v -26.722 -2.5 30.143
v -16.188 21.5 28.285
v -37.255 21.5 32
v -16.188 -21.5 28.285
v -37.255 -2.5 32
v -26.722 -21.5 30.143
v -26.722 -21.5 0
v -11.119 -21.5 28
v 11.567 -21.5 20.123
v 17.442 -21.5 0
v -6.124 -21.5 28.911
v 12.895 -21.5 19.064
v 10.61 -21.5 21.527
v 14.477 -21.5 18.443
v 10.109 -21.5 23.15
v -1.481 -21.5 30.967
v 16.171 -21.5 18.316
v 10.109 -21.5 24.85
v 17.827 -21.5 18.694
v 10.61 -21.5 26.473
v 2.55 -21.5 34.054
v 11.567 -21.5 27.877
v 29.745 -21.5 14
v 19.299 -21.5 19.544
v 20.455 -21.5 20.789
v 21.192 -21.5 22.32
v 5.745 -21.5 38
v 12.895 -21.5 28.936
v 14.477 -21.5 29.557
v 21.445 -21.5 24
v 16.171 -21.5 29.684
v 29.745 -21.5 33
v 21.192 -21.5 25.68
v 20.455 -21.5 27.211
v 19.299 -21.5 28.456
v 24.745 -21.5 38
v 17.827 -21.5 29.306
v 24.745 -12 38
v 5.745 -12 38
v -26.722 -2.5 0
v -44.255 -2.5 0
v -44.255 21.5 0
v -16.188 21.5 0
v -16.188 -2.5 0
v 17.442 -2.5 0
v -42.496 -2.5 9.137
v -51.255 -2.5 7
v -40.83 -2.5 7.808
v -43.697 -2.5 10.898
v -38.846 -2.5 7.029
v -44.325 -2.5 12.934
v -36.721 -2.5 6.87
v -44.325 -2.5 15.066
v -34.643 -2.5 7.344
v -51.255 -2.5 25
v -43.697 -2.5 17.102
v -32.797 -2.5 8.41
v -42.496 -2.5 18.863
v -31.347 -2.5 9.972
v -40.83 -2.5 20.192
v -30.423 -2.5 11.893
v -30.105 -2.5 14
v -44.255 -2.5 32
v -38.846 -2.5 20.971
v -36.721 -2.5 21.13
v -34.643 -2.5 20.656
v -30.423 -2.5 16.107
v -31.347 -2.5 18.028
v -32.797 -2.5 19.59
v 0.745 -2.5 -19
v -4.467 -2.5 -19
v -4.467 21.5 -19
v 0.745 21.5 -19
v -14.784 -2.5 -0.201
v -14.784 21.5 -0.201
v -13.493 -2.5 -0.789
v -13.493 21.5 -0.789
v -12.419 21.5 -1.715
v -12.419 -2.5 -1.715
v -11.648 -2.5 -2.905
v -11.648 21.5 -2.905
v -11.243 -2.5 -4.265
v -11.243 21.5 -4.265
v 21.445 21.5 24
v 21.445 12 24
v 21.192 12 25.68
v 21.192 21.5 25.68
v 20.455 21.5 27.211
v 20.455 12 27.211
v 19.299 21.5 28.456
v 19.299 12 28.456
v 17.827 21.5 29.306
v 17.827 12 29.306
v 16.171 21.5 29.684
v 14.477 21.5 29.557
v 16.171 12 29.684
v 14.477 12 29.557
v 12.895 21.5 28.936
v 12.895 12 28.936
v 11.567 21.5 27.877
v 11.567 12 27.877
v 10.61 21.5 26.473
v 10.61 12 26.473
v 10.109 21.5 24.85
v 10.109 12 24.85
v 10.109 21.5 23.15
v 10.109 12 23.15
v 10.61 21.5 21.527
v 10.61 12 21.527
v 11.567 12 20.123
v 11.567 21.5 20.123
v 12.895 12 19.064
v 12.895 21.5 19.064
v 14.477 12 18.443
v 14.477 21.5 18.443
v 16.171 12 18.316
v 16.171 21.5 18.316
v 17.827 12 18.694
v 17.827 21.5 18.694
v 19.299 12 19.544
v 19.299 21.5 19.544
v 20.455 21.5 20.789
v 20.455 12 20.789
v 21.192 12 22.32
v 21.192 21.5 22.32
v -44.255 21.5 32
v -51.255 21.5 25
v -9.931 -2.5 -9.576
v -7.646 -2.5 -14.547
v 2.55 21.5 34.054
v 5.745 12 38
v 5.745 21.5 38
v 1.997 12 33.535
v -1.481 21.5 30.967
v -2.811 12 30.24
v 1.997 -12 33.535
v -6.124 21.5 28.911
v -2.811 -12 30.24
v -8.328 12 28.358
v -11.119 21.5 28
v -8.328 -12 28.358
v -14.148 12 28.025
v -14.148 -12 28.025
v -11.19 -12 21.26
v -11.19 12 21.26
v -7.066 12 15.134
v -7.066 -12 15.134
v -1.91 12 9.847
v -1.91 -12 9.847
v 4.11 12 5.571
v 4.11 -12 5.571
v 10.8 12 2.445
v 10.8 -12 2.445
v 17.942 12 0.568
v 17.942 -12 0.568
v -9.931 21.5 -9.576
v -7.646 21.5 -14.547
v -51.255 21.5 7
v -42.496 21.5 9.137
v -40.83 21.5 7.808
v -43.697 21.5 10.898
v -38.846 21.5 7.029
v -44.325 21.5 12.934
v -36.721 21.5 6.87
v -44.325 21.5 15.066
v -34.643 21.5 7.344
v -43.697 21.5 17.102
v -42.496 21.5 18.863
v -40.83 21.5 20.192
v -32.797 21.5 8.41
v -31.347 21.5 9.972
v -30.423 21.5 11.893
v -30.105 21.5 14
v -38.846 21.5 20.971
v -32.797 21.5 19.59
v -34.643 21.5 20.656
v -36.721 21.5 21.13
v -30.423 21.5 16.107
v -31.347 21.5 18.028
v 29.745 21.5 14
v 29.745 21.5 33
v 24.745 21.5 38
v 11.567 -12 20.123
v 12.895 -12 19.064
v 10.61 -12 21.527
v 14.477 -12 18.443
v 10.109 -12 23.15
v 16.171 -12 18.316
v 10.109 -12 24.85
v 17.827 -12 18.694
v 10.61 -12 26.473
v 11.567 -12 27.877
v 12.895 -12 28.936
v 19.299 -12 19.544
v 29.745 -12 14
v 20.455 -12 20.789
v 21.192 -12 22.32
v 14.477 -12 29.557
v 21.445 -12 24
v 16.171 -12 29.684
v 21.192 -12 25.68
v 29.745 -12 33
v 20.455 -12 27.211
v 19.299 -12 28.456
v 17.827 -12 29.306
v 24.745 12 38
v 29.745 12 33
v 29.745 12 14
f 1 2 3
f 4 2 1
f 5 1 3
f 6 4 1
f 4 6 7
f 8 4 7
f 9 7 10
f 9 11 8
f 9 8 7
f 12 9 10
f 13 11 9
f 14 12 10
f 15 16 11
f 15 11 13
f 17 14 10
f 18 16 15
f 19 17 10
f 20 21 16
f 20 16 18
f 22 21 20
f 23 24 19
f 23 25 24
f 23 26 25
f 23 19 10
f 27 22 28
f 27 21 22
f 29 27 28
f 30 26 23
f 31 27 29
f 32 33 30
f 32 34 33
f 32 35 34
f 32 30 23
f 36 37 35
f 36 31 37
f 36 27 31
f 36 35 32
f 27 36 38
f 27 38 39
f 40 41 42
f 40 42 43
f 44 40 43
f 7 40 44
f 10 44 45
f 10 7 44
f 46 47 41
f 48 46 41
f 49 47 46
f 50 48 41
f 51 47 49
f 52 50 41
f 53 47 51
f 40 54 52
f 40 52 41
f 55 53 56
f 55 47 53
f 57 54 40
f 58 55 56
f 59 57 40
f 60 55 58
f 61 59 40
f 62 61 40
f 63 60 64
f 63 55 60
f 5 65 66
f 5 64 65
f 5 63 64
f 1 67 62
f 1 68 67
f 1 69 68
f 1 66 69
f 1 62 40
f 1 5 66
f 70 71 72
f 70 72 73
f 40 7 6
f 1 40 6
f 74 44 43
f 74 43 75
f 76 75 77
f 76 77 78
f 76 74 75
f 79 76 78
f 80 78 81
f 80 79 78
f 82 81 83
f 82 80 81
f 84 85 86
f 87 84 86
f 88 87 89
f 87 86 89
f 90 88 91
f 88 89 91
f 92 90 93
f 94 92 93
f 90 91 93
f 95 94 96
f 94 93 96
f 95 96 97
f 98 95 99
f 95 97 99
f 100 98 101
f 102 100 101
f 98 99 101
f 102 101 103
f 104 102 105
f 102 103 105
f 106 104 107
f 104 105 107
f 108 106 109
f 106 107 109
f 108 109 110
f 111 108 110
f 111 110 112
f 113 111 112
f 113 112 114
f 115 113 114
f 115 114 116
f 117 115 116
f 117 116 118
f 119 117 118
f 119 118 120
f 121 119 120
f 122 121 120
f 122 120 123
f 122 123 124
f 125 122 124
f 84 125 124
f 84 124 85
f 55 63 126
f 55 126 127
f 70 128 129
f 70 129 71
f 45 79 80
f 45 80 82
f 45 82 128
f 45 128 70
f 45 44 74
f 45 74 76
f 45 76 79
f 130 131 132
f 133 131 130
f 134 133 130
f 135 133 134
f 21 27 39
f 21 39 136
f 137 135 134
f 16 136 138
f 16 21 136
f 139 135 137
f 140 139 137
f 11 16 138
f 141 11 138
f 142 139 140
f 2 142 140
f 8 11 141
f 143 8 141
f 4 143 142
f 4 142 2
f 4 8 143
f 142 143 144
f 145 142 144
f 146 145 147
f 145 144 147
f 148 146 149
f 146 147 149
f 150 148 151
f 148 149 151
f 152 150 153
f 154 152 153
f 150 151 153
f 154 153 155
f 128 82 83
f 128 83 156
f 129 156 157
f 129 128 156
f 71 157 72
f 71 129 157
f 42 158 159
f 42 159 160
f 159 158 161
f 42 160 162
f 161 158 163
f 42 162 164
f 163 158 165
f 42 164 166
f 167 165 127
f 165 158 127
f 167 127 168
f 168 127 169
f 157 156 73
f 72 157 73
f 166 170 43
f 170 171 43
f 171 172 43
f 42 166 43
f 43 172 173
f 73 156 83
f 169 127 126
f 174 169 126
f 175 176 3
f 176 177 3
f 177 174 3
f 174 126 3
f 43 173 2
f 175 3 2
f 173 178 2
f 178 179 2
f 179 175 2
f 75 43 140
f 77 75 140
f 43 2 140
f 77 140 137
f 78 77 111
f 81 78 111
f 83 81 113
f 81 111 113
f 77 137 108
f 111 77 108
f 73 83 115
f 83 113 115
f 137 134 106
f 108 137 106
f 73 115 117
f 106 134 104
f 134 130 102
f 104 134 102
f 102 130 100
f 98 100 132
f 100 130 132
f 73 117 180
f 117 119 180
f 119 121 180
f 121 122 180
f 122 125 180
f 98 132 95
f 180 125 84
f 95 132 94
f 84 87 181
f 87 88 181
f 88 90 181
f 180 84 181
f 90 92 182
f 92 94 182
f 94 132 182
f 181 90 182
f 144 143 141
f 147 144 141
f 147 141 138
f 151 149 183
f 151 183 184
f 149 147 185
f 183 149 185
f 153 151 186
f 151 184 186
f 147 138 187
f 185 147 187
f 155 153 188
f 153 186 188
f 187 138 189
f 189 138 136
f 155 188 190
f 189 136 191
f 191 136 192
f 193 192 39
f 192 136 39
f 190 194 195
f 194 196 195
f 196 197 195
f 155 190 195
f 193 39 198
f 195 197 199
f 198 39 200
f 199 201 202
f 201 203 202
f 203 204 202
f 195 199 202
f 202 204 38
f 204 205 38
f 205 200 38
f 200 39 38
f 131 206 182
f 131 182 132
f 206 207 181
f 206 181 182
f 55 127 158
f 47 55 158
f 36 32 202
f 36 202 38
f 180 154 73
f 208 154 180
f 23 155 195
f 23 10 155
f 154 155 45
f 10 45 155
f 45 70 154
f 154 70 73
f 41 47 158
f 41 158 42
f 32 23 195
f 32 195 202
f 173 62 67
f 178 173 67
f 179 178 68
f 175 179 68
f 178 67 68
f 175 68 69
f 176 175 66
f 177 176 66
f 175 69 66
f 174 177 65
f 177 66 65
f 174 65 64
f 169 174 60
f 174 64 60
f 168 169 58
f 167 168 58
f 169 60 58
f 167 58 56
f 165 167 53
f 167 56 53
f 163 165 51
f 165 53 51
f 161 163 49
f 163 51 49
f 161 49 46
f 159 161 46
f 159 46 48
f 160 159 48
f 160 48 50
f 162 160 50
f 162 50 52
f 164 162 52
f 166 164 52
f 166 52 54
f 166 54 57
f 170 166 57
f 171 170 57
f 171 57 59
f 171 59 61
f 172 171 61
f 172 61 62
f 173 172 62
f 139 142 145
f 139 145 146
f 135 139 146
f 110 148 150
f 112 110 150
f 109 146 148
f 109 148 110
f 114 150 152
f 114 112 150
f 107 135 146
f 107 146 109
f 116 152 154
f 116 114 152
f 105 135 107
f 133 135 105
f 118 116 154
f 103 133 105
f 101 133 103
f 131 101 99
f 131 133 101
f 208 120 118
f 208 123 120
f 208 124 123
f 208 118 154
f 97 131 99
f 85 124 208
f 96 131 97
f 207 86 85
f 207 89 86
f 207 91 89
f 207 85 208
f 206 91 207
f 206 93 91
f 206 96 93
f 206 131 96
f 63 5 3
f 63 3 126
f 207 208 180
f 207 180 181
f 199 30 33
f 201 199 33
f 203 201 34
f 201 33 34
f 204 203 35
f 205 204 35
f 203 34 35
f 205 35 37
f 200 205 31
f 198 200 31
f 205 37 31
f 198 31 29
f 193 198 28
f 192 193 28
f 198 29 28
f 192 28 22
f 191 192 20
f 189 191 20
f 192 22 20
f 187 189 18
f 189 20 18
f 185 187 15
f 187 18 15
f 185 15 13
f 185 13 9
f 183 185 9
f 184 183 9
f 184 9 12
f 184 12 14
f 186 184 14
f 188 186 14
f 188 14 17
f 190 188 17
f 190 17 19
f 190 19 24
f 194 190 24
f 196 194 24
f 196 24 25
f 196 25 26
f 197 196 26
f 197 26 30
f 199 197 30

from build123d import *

# Parameters (mm, degrees)
F1_DEPTH = 21.5
F3_DEPTH = 19
F4_R     = 41
F5_DEPTH = 12
F6_R     = 5.7
F7_DEPTH = 43.001
F8_R     = 7.15
F9_DEPTH = 24.001


with BuildPart() as f1:
    # F0 (on Front) → F1 (new body, symmetric)
    with BuildSketch(Plane.XZ):
        with BuildLine():
            Line((-51.2549763874, 7), (-44.2549763874, 0))
            Line((-44.2549763874, 0), (-16.1883501321, 0))
            ThreePointArc((-16.1883501321, 0), (-12.923114351, -1.2134137678), (-11.2427113907, -4.2647058824))
            ThreePointArc((-11.2427113907, -4.2647058824), (-8.9058811875, -12.115672061), (-4.4669089907, -19))
            Line((-4.4669089907, -19), (0.7450236126, -19))
            Line((0.7450236126, -19), (29.7450236126, 14))
            Line((29.7450236126, 14), (29.7450236126, 33))
            Line((29.7450236126, 33), (24.7450236126, 38))
            Line((24.7450236126, 38), (5.7450236126, 38))
            ThreePointArc((5.7450236126, 38), (-3.7417667266, 29.8014254338), (-16.1883501321, 28.2853853987))
            Line((-16.1883501321, 28.2853853987), (-37.2549763874, 32))
            Line((-37.2549763874, 32), (-44.2549763874, 32))
            Line((-44.2549763874, 32), (-51.2549763874, 25))
            Line((-51.2549763874, 25), (-51.2549763874, 7))
        make_face()
    extrude(amount=F1_DEPTH, both=True)

    # F2 (on face) → F3 (cut)
    with BuildSketch(Plane.XZ.offset(21.5)):
        Polygon((-26.7216632598, 0), (-26.7216632598, 30.1426926993), (-37.2549763874, 32), (-44.2549763874, 32), (-51.2549763874, 25), (-51.2549763874, 7), (-44.2549763874, 0), align=None)
        with BuildLine():
            Line((17.4419933095, 0), (-16.1883501321, 0))
            ThreePointArc((-16.1883501321, 0), (-12.923114351, -1.2134137678), (-11.2427113907, -4.2647058824))
            ThreePointArc((-11.2427113907, -4.2647058824), (-8.9058811875, -12.115672061), (-4.4669089907, -19))
            Line((-4.4669089907, -19), (0.7450236126, -19))
            Line((0.7450236126, -19), (17.4419933095, 0))
        make_face()
    extrude(amount=-F3_DEPTH, mode=Mode.SUBTRACT)

    # F4 (on Front) → F5 (cut, symmetric)
    with BuildSketch(Plane.XZ):
        with Locations((24.7450236126, 41)):
            Circle(F4_R)
    extrude(amount=F5_DEPTH, both=True, mode=Mode.SUBTRACT)

    # F6 (on face) → F7 (cut, through all)
    with BuildSketch(Plane.XZ.offset(21.5)):
        with Locations((15.7450236126, 24)):
            Circle(F6_R)
    extrude(amount=-F7_DEPTH, mode=Mode.SUBTRACT)

    # F8 (on face) → F9 (cut, through all)
    with BuildSketch(Plane.XZ.offset(2.5)):
        with Locations((-37.2549763874, 14)):
            Circle(F8_R)
    extrude(amount=-F9_DEPTH, mode=Mode.SUBTRACT)


solid = f1.part
